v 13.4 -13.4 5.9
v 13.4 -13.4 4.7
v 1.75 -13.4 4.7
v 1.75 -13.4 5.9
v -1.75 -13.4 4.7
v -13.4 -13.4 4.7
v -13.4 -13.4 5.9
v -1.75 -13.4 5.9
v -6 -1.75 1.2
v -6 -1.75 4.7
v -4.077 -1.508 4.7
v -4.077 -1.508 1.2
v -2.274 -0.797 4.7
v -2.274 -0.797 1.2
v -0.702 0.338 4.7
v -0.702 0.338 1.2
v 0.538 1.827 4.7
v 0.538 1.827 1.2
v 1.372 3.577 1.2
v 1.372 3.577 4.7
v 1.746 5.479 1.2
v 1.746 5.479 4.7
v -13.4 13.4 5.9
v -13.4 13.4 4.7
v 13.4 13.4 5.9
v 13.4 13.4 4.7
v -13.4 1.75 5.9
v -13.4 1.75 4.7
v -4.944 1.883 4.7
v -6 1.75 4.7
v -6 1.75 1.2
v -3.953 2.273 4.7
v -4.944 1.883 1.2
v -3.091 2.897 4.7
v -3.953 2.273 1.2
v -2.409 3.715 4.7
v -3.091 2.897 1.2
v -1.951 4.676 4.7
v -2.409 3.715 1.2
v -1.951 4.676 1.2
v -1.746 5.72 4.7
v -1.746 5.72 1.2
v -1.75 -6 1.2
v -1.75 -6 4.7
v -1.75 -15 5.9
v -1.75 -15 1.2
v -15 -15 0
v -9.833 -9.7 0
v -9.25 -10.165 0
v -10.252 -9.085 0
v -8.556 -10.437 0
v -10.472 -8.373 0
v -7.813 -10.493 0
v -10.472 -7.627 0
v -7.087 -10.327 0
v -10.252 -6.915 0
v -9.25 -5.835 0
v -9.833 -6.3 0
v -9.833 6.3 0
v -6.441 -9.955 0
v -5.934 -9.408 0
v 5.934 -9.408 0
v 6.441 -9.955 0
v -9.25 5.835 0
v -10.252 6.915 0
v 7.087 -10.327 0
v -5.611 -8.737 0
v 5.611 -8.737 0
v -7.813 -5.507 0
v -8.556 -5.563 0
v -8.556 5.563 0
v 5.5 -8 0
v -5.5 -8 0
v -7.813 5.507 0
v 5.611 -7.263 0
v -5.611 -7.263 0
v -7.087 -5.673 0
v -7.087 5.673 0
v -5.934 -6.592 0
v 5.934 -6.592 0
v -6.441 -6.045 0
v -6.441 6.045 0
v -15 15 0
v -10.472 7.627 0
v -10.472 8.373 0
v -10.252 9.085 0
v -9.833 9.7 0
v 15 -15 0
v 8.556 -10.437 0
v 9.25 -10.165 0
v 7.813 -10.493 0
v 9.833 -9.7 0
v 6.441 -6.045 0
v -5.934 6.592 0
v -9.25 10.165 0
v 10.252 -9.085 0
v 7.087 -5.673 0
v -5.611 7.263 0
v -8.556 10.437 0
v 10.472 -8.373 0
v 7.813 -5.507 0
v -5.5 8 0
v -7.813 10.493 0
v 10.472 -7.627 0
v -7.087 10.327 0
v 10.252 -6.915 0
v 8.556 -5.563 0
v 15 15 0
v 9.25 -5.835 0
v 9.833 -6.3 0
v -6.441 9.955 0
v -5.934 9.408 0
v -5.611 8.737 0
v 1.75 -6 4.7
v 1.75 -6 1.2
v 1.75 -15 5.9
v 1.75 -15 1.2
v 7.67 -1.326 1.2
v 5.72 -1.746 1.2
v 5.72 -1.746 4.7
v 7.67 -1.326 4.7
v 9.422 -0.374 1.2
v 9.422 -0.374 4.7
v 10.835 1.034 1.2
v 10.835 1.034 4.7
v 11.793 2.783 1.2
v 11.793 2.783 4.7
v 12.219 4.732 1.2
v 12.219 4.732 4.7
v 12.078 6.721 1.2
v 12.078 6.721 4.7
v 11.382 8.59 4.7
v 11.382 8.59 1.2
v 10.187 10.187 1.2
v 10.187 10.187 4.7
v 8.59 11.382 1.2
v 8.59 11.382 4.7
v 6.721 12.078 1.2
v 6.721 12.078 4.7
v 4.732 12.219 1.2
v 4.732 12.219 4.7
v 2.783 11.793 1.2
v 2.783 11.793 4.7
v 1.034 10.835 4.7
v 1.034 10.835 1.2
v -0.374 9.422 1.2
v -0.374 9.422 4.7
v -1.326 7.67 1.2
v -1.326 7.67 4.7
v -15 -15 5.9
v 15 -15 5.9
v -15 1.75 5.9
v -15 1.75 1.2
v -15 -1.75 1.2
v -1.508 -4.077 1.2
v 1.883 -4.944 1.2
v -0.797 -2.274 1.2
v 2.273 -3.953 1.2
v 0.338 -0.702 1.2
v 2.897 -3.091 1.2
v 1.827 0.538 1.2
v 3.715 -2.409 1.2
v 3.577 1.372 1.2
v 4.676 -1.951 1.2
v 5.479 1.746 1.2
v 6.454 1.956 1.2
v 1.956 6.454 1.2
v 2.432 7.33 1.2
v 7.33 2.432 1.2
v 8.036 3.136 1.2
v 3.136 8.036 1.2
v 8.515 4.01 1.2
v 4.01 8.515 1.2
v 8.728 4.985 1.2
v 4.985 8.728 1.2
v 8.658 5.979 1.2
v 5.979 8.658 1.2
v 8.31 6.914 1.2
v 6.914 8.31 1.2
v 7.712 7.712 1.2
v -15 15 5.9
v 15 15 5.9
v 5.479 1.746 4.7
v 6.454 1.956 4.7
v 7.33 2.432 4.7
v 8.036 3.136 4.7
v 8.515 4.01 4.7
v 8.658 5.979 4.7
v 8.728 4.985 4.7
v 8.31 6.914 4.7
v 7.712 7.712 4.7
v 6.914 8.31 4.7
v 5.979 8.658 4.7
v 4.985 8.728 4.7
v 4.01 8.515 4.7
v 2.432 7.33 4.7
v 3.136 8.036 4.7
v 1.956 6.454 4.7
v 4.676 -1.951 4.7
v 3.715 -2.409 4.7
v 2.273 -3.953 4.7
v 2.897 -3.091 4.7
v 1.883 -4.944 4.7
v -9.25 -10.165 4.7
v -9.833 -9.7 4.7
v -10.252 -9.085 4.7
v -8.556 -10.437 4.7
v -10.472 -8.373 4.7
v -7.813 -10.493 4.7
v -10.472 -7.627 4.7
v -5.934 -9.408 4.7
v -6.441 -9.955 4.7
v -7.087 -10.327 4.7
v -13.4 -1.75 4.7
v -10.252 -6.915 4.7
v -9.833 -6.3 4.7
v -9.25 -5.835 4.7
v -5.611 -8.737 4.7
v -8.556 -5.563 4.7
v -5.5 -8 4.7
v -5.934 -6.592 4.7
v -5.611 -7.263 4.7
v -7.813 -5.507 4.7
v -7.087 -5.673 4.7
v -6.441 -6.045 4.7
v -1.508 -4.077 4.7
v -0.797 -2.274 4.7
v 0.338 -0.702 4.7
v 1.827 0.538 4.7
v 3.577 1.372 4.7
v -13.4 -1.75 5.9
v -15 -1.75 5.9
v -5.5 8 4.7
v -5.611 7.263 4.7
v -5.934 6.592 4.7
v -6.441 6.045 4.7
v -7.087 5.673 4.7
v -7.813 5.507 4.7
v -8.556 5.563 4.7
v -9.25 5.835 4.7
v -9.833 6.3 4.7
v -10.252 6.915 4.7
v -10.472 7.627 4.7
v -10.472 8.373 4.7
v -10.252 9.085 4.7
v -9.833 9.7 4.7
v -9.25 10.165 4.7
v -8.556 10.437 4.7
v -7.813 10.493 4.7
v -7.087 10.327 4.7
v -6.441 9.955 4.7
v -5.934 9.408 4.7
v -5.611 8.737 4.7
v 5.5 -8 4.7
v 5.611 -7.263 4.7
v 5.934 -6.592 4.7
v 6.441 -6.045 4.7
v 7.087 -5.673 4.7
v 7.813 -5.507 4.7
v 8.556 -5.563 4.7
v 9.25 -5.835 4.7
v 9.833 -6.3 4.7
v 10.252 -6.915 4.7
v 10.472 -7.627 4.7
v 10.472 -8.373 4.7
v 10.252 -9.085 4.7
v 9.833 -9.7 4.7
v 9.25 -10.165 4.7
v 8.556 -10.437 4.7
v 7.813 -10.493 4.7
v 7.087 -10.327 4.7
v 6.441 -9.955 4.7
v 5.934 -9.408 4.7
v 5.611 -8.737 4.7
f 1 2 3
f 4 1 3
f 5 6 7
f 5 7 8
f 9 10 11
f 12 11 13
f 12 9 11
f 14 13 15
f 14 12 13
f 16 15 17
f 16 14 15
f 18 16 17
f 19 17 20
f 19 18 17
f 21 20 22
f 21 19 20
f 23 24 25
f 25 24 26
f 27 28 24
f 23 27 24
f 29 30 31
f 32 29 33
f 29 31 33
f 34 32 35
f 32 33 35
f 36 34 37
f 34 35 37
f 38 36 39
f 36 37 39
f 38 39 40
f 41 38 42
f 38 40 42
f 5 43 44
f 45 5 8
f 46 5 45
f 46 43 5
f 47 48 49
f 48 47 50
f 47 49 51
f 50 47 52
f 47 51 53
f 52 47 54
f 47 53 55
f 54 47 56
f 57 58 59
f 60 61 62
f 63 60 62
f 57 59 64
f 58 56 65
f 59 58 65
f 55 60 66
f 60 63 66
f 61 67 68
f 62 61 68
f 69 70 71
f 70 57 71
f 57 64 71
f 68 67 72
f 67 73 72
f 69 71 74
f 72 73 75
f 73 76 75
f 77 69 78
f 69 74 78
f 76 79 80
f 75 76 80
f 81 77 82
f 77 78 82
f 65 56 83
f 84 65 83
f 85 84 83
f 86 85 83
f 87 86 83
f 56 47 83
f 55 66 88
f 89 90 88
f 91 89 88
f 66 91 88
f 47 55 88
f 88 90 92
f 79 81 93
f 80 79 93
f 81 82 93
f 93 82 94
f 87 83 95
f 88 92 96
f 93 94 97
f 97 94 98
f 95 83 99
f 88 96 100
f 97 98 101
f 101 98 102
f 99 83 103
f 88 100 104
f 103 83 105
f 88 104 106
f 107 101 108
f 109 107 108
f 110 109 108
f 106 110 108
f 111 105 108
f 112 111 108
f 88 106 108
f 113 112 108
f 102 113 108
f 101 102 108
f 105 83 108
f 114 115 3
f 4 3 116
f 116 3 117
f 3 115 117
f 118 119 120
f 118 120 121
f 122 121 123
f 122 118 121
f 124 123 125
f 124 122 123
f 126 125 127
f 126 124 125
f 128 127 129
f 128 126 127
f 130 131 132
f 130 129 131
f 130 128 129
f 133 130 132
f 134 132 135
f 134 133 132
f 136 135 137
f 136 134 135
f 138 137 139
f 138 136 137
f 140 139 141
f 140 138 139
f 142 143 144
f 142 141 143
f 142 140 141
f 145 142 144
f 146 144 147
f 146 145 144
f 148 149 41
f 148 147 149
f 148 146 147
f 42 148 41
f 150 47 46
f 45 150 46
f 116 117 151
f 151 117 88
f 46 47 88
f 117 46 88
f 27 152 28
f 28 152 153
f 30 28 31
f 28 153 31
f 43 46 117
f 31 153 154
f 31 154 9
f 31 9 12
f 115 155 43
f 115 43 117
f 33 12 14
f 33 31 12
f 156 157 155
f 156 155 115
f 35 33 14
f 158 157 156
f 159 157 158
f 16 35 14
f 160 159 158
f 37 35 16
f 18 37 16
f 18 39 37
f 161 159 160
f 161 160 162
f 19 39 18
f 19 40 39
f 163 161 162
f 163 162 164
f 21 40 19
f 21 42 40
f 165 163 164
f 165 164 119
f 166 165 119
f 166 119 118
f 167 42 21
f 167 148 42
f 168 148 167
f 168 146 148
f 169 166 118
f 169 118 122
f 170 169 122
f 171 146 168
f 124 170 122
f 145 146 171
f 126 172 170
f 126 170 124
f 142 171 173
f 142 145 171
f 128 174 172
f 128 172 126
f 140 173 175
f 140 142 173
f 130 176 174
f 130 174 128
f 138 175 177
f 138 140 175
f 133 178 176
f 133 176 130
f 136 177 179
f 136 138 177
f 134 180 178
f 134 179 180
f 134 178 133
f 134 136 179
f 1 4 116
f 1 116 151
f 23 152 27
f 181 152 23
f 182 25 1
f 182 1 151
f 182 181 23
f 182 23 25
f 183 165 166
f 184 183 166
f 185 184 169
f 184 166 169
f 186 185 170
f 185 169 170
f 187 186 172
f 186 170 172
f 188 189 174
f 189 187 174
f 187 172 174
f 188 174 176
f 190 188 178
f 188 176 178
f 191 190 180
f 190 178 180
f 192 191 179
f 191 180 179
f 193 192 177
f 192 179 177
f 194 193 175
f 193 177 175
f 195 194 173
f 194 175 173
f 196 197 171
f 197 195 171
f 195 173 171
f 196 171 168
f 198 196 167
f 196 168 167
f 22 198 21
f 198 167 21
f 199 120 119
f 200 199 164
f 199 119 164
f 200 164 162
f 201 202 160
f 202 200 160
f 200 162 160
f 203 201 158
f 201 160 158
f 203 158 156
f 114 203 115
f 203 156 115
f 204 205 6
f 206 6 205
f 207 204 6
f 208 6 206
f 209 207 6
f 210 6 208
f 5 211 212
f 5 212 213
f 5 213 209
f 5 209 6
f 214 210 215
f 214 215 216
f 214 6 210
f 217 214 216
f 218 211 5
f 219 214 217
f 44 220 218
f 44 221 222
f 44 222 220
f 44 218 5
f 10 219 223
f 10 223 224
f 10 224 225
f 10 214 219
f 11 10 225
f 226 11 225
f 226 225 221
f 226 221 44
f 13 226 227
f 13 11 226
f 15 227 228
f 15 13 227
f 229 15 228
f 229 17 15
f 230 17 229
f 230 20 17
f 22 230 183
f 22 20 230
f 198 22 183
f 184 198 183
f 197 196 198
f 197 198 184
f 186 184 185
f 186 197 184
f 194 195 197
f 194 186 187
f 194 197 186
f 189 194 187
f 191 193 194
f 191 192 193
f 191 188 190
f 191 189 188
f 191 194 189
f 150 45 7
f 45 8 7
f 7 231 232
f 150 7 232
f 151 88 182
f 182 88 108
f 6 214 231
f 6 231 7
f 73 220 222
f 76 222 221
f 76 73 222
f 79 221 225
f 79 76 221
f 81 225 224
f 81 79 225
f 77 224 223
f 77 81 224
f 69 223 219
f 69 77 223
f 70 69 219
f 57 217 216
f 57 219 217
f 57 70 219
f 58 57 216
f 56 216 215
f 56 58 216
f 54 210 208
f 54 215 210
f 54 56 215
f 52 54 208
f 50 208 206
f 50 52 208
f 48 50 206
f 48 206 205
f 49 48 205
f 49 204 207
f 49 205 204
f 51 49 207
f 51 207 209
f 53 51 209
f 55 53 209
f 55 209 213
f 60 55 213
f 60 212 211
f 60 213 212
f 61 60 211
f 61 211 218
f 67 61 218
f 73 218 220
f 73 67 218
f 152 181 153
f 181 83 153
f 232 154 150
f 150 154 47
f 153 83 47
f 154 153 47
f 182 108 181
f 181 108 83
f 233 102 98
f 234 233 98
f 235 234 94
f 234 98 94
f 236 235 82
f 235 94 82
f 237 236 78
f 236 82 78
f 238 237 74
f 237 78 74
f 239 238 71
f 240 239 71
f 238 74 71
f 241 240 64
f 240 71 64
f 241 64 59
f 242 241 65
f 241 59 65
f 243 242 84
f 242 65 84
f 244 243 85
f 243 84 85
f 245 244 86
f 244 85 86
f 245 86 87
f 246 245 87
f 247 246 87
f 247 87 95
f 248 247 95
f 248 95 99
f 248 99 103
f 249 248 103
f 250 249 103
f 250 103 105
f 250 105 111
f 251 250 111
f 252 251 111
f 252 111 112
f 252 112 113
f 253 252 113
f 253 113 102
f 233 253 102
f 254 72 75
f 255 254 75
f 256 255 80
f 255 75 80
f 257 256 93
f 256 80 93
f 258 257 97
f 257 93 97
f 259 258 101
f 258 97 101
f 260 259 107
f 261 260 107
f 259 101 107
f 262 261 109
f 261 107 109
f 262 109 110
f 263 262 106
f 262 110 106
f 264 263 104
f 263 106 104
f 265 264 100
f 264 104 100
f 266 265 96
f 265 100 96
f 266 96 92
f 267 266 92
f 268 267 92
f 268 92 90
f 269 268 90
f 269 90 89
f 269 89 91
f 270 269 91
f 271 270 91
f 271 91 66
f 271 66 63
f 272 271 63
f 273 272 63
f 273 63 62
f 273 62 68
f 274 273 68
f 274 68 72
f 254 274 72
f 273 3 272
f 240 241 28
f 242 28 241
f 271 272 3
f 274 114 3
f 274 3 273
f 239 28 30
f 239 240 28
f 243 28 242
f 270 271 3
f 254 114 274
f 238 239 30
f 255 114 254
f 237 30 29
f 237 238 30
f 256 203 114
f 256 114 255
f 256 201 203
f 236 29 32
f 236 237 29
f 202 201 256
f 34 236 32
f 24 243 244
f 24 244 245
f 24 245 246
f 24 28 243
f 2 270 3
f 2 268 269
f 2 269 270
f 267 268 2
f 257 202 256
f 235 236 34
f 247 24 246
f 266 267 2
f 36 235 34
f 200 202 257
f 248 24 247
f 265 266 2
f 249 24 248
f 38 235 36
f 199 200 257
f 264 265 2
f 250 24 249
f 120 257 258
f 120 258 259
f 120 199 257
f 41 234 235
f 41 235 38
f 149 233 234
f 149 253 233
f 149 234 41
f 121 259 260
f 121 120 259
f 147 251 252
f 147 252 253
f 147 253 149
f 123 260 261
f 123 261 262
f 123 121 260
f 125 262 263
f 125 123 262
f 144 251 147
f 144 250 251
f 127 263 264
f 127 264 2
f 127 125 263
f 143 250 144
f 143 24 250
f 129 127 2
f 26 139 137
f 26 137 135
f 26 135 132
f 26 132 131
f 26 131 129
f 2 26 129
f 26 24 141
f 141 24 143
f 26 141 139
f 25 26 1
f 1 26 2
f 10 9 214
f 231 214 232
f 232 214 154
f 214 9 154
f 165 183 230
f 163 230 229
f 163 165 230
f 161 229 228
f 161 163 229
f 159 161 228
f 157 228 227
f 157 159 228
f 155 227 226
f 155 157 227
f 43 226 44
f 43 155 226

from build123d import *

# Parameters (mm, degrees)
SKETCH027_W     = 30
SKETCH027_H     = 30
PAD013_DEPTH    = 4.7
POCKET011_DEPTH = 3.501
PAD014_DEPTH    = 1.2
SKETCH031_R     = 2.5
POCKET012_DEPTH = 91.570364


with BuildPart() as part:
    # Sketch027 → Pad013 (new body)
    with BuildSketch(Plane.XY):
        Rectangle(SKETCH027_W, SKETCH027_H)
    extrude(amount=PAD013_DEPTH)

    # Sketch028 → Pocket011 (cut, through all)
    with BuildSketch(Plane.XY.offset(1.2)):
        with BuildLine():
            Line((-6, 1.75), (-15, 1.75))
            Line((-15, 1.75), (-15, -1.75))
            Line((-6, -1.75), (-15, -1.75))
            ThreePointArc((-6, -1.75), (-0.702489, 0.337963), (1.745834, 5.47887))
            ThreePointArc((5.47887, 1.745834), (7.712375, 7.712375), (1.745834, 5.47887))
            ThreePointArc((5.47887, 1.745834), (0.337963, -0.702489), (-1.75, -6))
            Line((-1.75, -6), (-1.75, -15))
            Line((1.75, -15), (-1.75, -15))
            Line((1.75, -6), (1.75, -15))
            ThreePointArc((5.72024, -1.745834), (2.896751, -3.090501), (1.75, -6))
            ThreePointArc((5.72024, -1.745834), (10.187248, 10.187248), (-1.745834, 5.72024))
            ThreePointArc((-6, 1.75), (-3.090501, 2.896751), (-1.745834, 5.72024))
        make_face()
    extrude(amount=POCKET011_DEPTH, mode=Mode.SUBTRACT)

    # Sketch029 → Pad014 (join)
    with BuildSketch(Plane.XY.offset(4.7)):
        Polygon((15, -15), (15, 15), (-15, 15), (-15, 1.75), (-13.4, 1.75), (-13.4, 13.4), (13.4, 13.4), (13.4, -13.4), (1.75, -13.4), (1.75, -15), align=None)
        Polygon((-1.75, -15), (-15, -15), (-15, -1.75), (-13.4, -1.75), (-13.4, -13.4), (-1.75, -13.4), align=None)
    extrude(amount=PAD014_DEPTH)

    # Sketch031 → Pocket012 (cut, through all)
    with BuildSketch(Plane.XY):
        with Locations((-8, -8)):
            Circle(SKETCH031_R)
    pocket012 = extrude(amount=POCKET012_DEPTH, mode=Mode.SUBTRACT)

    # Mirrored004: Pocket012 across Sketch031 V_Axis
    add(pocket012.mirror(Plane(origin=(0, 0, 0), x_dir=(0, 0, 1), z_dir=(1, 0, 0))), mode=Mode.SUBTRACT)

    # Mirrored005: Pocket012 across Sketch031 H_Axis
    add(pocket012.mirror(Plane.ZX), mode=Mode.SUBTRACT)


solid = part.part
